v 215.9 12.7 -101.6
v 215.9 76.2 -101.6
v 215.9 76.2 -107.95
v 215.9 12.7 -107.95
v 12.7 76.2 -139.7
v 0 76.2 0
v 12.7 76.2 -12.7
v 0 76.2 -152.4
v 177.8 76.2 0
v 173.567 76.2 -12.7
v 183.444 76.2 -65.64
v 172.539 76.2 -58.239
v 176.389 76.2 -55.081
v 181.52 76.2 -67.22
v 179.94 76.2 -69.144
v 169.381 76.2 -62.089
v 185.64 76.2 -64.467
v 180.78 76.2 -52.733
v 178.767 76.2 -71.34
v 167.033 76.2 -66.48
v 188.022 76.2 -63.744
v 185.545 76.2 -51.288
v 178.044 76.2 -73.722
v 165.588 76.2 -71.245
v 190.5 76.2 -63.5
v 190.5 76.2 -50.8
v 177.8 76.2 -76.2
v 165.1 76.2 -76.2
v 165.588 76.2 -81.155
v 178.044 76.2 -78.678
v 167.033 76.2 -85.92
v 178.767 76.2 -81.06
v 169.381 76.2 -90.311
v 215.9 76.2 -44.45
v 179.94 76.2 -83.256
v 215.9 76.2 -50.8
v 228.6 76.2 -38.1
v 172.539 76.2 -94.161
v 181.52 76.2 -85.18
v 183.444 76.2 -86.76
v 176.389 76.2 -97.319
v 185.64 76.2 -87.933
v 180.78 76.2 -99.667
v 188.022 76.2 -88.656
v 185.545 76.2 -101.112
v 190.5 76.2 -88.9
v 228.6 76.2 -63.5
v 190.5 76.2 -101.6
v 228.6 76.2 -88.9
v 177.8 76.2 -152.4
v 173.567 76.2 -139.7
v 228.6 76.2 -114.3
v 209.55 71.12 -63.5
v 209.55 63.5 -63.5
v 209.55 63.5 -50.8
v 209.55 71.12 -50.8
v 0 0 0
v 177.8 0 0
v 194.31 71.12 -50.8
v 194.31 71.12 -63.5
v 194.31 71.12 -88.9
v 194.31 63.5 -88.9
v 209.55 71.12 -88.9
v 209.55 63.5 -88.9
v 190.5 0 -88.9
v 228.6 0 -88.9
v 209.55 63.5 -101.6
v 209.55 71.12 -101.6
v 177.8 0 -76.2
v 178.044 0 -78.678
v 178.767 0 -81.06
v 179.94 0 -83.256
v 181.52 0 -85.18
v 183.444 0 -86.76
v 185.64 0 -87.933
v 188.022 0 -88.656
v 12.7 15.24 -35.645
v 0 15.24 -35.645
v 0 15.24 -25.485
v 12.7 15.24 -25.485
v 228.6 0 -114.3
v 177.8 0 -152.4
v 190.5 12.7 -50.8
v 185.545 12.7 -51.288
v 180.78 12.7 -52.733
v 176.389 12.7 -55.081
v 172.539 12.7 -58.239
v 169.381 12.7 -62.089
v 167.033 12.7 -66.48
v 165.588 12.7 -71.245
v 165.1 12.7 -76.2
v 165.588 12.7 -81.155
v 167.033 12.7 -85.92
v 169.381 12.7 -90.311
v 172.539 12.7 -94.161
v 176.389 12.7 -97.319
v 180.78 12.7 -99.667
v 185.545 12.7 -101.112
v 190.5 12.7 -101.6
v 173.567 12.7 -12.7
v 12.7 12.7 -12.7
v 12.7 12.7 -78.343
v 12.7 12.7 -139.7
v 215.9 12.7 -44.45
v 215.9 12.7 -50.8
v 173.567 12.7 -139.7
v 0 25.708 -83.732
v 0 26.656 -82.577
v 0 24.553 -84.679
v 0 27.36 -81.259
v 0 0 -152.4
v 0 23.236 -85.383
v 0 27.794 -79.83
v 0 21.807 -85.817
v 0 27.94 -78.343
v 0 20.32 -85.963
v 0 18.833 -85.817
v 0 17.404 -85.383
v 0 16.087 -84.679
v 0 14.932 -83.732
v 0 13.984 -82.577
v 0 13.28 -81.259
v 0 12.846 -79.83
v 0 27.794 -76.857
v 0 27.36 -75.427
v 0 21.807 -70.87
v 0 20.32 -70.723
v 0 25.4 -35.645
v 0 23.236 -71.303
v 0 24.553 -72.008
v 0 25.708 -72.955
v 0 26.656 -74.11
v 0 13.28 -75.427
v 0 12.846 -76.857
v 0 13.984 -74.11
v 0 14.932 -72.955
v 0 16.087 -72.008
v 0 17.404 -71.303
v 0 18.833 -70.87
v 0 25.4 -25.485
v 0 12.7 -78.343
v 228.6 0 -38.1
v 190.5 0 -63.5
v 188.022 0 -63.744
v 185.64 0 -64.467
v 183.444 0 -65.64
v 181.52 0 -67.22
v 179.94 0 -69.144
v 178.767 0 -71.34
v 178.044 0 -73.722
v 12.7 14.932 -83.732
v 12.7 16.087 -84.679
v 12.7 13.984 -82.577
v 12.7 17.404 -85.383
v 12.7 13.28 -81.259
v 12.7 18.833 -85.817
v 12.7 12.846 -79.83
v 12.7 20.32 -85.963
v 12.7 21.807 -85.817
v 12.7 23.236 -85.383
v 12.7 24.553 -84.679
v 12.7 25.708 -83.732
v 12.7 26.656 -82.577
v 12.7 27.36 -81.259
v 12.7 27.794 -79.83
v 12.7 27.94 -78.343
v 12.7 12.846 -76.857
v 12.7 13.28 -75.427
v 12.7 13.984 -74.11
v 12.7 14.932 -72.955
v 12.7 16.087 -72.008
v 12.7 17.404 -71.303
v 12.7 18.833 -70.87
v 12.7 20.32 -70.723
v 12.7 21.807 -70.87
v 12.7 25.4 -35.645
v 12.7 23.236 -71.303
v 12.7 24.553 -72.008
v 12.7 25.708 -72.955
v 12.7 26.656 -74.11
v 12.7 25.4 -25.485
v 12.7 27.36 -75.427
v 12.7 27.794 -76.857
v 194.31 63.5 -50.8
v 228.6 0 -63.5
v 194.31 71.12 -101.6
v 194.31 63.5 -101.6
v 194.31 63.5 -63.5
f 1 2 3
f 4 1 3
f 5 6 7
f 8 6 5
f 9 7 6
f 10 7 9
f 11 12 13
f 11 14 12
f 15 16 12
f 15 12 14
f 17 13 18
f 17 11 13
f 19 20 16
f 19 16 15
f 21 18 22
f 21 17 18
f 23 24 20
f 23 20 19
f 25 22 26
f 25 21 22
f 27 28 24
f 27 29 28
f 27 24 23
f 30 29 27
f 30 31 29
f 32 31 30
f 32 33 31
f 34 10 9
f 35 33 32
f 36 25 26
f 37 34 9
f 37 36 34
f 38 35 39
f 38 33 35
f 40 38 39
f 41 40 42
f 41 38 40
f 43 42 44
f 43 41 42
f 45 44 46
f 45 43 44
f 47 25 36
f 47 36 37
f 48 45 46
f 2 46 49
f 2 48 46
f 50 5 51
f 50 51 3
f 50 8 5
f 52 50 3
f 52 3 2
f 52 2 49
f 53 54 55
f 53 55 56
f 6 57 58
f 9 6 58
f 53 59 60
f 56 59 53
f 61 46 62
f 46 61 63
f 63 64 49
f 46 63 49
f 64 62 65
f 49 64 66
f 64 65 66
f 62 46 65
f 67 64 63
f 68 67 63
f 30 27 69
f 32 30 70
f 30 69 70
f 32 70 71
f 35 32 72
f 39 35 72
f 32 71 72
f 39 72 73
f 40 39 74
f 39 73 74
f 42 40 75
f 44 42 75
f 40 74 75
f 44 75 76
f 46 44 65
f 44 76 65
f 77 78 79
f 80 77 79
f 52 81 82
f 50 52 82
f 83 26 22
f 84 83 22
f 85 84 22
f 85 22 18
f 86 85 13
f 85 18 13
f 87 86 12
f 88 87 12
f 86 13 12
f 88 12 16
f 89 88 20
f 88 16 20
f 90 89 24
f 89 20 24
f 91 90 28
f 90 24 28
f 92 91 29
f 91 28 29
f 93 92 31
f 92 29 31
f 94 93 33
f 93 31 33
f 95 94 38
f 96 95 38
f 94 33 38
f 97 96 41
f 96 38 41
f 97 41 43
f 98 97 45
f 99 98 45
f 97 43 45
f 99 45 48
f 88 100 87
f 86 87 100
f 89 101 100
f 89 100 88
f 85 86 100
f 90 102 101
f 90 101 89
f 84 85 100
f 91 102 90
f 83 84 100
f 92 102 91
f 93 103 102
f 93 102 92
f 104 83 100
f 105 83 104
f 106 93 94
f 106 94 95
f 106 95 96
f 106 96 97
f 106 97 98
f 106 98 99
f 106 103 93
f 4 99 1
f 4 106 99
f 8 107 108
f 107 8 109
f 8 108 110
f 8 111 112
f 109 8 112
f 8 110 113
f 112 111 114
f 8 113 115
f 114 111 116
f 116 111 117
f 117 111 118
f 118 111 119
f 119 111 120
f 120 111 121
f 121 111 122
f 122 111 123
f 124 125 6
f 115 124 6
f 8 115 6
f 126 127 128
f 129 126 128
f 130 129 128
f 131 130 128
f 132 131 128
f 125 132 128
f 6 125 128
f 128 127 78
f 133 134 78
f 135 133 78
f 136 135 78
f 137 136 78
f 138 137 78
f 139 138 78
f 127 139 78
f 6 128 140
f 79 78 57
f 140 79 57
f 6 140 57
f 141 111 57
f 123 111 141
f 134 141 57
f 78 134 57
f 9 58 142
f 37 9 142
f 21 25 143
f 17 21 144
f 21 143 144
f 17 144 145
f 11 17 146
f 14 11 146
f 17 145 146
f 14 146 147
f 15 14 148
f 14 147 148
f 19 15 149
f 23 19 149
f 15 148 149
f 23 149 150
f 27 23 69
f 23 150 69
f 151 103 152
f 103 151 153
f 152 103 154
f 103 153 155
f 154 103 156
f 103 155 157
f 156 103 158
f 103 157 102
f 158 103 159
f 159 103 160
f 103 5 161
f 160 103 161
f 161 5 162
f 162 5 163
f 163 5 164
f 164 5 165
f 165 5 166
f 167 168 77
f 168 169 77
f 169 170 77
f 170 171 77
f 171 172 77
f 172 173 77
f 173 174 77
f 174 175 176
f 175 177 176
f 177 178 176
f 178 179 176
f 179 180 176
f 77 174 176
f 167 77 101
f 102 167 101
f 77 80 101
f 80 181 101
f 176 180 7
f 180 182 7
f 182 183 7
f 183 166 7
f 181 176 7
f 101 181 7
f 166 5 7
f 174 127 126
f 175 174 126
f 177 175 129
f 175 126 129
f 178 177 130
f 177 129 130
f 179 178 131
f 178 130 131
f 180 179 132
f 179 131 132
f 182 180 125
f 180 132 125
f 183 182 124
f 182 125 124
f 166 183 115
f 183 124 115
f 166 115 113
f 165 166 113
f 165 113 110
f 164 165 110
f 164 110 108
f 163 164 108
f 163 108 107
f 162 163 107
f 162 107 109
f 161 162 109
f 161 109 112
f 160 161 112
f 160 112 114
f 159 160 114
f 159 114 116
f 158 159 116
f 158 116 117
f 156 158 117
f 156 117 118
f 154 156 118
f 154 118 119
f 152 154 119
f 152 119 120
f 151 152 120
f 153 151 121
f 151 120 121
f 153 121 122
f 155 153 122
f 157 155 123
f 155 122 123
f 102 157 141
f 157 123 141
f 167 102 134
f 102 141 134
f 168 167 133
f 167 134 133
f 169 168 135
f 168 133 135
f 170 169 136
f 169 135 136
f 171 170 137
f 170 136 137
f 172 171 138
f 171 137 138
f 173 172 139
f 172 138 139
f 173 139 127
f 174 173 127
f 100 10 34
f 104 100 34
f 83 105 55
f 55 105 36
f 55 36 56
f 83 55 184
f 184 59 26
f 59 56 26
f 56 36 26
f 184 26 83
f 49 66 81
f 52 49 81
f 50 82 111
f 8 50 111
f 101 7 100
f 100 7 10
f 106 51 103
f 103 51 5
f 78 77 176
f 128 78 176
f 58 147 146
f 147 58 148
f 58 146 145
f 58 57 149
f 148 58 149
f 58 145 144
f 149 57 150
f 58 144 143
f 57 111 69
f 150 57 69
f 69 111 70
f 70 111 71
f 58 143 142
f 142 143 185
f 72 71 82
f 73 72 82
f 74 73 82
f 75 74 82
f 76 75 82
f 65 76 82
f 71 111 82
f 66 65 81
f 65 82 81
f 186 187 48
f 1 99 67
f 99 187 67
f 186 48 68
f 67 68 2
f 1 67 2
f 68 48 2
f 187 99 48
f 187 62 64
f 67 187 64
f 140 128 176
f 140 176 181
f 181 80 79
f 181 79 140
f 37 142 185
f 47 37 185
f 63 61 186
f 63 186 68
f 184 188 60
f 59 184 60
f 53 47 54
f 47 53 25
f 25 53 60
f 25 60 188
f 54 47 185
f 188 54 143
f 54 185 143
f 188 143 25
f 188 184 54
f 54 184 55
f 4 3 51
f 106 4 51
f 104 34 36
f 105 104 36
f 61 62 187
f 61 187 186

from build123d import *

# Parameters (mm, degrees)
BOSS_EXTRUDE3_DEPTH = 76.2
CUT_EXTRUDE1_DEPTH  = 63.5
SKETCH6_R           = 7.62
SKETCH6_W           = 10.16
SKETCH6_H           = 10.16
CUT_EXTRUDE2_DEPTH  = 12.7
CUT_EXTRUDE3_REACH  = 263.509
SKETCH12_W          = 15.24
SKETCH12_H          = 7.62


with BuildPart() as part:
    # Sketch1 → Boss-Extrude3 (new body)
    with BuildSketch(Plane(origin=(0, 0, 0), x_dir=(1, 0, 0), z_dir=(0, 1, 0))):
        Polygon((177.8, 76.2), (0, 76.2), (0, 0), (177.8, 0), (177.8, 38.1), (177.8, 63.5), align=None)
        Polygon((0, 152.4), (0, 76.2), (177.8, 76.2), (177.8, 88.9), (177.8, 114.3), (177.8, 152.4), align=None)
        Polygon((228.6, 114.3), (177.8, 152.4), (177.8, 114.3), align=None)
        Polygon((177.8, 114.3), (177.8, 88.9), (190.5, 88.9), (228.6, 88.9), (228.6, 114.3), align=None)
        Polygon((177.8, 38.1), (177.8, 0), (228.6, 38.1), align=None)
        Polygon((190.5, 63.5), (177.8, 63.5), (177.8, 38.1), (228.6, 38.1), (228.6, 63.5), align=None)
        with BuildLine():
            ThreePointArc((190.5, 63.5), (181.519743879, 67.219743879), (177.8, 76.2))
            Line((177.8, 76.2), (177.8, 63.5))
            Line((177.8, 63.5), (190.5, 63.5))
        make_face()
        with BuildLine():
            Line((177.8, 88.9), (177.8, 76.2))
            ThreePointArc((177.8, 76.2), (181.519743879, 85.180256121), (190.5, 88.9))
            Line((190.5, 88.9), (177.8, 88.9))
        make_face()
    extrude(amount=BOSS_EXTRUDE3_DEPTH)

    # Sketch4 → Cut-Extrude1 (cut)
    with BuildSketch(Plane(origin=(0, 76.2, 0), x_dir=(1, 0, 0), z_dir=(0, 1, 0))):
        with BuildLine():
            Line((215.9, 101.6), (215.9, 107.95))
            Line((215.9, 107.95), (173.566666667, 139.7))
            Line((173.566666667, 139.7), (12.7, 139.7))
            Line((12.7, 139.7), (12.7, 12.7))
            Line((12.7, 12.7), (173.566666667, 12.7))
            Line((173.566666667, 12.7), (215.9, 44.45))
            Line((215.9, 44.45), (215.9, 50.8))
            Line((215.9, 50.8), (190.5, 50.8))
            ThreePointArc((190.5, 50.8), (165.1, 76.2), (190.5, 101.6))
            Line((190.5, 101.6), (215.9, 101.6))
        make_face()
    extrude(amount=-CUT_EXTRUDE1_DEPTH, mode=Mode.SUBTRACT)

    # Sketch6 → Cut-Extrude2 (cut)
    with BuildSketch(Plane.ZY):
        with Locations((-78.343351815, 20.32)):
            Circle(SKETCH6_R)
        with Locations((-30.565080817, 20.32)):
            Rectangle(SKETCH6_W, SKETCH6_H)
    extrude(amount=-CUT_EXTRUDE2_DEPTH, mode=Mode.SUBTRACT)

    # Cut-Extrude3: up to this face of the body (flat: up to its plane)
    cut_extrude3_end = Plane(part.part.faces().sort_by_distance((203.2, 44.45, -101.6))[0])
    # Sketch12 → Cut-Extrude3 (cut, up to the picked face)
    with BuildSketch(Plane.XY.offset(-50.8), mode=Mode.PRIVATE) as cut_extrude3_sk1:
        with Locations((201.93, 67.31)):
            Rectangle(SKETCH12_W, SKETCH12_H)
    cut_extrude3_tool1 = split(extrude(cut_extrude3_sk1.sketch, amount=-CUT_EXTRUDE3_REACH, mode=Mode.PRIVATE), bisect_by=cut_extrude3_end, keep=Keep.BOTH, mode=Mode.PRIVATE)
    add(cut_extrude3_tool1.solids().sort_by(Axis((201.93, 67.31, -50.8), (0, 0, -1)))[0], mode=Mode.SUBTRACT)


solid = part.part
